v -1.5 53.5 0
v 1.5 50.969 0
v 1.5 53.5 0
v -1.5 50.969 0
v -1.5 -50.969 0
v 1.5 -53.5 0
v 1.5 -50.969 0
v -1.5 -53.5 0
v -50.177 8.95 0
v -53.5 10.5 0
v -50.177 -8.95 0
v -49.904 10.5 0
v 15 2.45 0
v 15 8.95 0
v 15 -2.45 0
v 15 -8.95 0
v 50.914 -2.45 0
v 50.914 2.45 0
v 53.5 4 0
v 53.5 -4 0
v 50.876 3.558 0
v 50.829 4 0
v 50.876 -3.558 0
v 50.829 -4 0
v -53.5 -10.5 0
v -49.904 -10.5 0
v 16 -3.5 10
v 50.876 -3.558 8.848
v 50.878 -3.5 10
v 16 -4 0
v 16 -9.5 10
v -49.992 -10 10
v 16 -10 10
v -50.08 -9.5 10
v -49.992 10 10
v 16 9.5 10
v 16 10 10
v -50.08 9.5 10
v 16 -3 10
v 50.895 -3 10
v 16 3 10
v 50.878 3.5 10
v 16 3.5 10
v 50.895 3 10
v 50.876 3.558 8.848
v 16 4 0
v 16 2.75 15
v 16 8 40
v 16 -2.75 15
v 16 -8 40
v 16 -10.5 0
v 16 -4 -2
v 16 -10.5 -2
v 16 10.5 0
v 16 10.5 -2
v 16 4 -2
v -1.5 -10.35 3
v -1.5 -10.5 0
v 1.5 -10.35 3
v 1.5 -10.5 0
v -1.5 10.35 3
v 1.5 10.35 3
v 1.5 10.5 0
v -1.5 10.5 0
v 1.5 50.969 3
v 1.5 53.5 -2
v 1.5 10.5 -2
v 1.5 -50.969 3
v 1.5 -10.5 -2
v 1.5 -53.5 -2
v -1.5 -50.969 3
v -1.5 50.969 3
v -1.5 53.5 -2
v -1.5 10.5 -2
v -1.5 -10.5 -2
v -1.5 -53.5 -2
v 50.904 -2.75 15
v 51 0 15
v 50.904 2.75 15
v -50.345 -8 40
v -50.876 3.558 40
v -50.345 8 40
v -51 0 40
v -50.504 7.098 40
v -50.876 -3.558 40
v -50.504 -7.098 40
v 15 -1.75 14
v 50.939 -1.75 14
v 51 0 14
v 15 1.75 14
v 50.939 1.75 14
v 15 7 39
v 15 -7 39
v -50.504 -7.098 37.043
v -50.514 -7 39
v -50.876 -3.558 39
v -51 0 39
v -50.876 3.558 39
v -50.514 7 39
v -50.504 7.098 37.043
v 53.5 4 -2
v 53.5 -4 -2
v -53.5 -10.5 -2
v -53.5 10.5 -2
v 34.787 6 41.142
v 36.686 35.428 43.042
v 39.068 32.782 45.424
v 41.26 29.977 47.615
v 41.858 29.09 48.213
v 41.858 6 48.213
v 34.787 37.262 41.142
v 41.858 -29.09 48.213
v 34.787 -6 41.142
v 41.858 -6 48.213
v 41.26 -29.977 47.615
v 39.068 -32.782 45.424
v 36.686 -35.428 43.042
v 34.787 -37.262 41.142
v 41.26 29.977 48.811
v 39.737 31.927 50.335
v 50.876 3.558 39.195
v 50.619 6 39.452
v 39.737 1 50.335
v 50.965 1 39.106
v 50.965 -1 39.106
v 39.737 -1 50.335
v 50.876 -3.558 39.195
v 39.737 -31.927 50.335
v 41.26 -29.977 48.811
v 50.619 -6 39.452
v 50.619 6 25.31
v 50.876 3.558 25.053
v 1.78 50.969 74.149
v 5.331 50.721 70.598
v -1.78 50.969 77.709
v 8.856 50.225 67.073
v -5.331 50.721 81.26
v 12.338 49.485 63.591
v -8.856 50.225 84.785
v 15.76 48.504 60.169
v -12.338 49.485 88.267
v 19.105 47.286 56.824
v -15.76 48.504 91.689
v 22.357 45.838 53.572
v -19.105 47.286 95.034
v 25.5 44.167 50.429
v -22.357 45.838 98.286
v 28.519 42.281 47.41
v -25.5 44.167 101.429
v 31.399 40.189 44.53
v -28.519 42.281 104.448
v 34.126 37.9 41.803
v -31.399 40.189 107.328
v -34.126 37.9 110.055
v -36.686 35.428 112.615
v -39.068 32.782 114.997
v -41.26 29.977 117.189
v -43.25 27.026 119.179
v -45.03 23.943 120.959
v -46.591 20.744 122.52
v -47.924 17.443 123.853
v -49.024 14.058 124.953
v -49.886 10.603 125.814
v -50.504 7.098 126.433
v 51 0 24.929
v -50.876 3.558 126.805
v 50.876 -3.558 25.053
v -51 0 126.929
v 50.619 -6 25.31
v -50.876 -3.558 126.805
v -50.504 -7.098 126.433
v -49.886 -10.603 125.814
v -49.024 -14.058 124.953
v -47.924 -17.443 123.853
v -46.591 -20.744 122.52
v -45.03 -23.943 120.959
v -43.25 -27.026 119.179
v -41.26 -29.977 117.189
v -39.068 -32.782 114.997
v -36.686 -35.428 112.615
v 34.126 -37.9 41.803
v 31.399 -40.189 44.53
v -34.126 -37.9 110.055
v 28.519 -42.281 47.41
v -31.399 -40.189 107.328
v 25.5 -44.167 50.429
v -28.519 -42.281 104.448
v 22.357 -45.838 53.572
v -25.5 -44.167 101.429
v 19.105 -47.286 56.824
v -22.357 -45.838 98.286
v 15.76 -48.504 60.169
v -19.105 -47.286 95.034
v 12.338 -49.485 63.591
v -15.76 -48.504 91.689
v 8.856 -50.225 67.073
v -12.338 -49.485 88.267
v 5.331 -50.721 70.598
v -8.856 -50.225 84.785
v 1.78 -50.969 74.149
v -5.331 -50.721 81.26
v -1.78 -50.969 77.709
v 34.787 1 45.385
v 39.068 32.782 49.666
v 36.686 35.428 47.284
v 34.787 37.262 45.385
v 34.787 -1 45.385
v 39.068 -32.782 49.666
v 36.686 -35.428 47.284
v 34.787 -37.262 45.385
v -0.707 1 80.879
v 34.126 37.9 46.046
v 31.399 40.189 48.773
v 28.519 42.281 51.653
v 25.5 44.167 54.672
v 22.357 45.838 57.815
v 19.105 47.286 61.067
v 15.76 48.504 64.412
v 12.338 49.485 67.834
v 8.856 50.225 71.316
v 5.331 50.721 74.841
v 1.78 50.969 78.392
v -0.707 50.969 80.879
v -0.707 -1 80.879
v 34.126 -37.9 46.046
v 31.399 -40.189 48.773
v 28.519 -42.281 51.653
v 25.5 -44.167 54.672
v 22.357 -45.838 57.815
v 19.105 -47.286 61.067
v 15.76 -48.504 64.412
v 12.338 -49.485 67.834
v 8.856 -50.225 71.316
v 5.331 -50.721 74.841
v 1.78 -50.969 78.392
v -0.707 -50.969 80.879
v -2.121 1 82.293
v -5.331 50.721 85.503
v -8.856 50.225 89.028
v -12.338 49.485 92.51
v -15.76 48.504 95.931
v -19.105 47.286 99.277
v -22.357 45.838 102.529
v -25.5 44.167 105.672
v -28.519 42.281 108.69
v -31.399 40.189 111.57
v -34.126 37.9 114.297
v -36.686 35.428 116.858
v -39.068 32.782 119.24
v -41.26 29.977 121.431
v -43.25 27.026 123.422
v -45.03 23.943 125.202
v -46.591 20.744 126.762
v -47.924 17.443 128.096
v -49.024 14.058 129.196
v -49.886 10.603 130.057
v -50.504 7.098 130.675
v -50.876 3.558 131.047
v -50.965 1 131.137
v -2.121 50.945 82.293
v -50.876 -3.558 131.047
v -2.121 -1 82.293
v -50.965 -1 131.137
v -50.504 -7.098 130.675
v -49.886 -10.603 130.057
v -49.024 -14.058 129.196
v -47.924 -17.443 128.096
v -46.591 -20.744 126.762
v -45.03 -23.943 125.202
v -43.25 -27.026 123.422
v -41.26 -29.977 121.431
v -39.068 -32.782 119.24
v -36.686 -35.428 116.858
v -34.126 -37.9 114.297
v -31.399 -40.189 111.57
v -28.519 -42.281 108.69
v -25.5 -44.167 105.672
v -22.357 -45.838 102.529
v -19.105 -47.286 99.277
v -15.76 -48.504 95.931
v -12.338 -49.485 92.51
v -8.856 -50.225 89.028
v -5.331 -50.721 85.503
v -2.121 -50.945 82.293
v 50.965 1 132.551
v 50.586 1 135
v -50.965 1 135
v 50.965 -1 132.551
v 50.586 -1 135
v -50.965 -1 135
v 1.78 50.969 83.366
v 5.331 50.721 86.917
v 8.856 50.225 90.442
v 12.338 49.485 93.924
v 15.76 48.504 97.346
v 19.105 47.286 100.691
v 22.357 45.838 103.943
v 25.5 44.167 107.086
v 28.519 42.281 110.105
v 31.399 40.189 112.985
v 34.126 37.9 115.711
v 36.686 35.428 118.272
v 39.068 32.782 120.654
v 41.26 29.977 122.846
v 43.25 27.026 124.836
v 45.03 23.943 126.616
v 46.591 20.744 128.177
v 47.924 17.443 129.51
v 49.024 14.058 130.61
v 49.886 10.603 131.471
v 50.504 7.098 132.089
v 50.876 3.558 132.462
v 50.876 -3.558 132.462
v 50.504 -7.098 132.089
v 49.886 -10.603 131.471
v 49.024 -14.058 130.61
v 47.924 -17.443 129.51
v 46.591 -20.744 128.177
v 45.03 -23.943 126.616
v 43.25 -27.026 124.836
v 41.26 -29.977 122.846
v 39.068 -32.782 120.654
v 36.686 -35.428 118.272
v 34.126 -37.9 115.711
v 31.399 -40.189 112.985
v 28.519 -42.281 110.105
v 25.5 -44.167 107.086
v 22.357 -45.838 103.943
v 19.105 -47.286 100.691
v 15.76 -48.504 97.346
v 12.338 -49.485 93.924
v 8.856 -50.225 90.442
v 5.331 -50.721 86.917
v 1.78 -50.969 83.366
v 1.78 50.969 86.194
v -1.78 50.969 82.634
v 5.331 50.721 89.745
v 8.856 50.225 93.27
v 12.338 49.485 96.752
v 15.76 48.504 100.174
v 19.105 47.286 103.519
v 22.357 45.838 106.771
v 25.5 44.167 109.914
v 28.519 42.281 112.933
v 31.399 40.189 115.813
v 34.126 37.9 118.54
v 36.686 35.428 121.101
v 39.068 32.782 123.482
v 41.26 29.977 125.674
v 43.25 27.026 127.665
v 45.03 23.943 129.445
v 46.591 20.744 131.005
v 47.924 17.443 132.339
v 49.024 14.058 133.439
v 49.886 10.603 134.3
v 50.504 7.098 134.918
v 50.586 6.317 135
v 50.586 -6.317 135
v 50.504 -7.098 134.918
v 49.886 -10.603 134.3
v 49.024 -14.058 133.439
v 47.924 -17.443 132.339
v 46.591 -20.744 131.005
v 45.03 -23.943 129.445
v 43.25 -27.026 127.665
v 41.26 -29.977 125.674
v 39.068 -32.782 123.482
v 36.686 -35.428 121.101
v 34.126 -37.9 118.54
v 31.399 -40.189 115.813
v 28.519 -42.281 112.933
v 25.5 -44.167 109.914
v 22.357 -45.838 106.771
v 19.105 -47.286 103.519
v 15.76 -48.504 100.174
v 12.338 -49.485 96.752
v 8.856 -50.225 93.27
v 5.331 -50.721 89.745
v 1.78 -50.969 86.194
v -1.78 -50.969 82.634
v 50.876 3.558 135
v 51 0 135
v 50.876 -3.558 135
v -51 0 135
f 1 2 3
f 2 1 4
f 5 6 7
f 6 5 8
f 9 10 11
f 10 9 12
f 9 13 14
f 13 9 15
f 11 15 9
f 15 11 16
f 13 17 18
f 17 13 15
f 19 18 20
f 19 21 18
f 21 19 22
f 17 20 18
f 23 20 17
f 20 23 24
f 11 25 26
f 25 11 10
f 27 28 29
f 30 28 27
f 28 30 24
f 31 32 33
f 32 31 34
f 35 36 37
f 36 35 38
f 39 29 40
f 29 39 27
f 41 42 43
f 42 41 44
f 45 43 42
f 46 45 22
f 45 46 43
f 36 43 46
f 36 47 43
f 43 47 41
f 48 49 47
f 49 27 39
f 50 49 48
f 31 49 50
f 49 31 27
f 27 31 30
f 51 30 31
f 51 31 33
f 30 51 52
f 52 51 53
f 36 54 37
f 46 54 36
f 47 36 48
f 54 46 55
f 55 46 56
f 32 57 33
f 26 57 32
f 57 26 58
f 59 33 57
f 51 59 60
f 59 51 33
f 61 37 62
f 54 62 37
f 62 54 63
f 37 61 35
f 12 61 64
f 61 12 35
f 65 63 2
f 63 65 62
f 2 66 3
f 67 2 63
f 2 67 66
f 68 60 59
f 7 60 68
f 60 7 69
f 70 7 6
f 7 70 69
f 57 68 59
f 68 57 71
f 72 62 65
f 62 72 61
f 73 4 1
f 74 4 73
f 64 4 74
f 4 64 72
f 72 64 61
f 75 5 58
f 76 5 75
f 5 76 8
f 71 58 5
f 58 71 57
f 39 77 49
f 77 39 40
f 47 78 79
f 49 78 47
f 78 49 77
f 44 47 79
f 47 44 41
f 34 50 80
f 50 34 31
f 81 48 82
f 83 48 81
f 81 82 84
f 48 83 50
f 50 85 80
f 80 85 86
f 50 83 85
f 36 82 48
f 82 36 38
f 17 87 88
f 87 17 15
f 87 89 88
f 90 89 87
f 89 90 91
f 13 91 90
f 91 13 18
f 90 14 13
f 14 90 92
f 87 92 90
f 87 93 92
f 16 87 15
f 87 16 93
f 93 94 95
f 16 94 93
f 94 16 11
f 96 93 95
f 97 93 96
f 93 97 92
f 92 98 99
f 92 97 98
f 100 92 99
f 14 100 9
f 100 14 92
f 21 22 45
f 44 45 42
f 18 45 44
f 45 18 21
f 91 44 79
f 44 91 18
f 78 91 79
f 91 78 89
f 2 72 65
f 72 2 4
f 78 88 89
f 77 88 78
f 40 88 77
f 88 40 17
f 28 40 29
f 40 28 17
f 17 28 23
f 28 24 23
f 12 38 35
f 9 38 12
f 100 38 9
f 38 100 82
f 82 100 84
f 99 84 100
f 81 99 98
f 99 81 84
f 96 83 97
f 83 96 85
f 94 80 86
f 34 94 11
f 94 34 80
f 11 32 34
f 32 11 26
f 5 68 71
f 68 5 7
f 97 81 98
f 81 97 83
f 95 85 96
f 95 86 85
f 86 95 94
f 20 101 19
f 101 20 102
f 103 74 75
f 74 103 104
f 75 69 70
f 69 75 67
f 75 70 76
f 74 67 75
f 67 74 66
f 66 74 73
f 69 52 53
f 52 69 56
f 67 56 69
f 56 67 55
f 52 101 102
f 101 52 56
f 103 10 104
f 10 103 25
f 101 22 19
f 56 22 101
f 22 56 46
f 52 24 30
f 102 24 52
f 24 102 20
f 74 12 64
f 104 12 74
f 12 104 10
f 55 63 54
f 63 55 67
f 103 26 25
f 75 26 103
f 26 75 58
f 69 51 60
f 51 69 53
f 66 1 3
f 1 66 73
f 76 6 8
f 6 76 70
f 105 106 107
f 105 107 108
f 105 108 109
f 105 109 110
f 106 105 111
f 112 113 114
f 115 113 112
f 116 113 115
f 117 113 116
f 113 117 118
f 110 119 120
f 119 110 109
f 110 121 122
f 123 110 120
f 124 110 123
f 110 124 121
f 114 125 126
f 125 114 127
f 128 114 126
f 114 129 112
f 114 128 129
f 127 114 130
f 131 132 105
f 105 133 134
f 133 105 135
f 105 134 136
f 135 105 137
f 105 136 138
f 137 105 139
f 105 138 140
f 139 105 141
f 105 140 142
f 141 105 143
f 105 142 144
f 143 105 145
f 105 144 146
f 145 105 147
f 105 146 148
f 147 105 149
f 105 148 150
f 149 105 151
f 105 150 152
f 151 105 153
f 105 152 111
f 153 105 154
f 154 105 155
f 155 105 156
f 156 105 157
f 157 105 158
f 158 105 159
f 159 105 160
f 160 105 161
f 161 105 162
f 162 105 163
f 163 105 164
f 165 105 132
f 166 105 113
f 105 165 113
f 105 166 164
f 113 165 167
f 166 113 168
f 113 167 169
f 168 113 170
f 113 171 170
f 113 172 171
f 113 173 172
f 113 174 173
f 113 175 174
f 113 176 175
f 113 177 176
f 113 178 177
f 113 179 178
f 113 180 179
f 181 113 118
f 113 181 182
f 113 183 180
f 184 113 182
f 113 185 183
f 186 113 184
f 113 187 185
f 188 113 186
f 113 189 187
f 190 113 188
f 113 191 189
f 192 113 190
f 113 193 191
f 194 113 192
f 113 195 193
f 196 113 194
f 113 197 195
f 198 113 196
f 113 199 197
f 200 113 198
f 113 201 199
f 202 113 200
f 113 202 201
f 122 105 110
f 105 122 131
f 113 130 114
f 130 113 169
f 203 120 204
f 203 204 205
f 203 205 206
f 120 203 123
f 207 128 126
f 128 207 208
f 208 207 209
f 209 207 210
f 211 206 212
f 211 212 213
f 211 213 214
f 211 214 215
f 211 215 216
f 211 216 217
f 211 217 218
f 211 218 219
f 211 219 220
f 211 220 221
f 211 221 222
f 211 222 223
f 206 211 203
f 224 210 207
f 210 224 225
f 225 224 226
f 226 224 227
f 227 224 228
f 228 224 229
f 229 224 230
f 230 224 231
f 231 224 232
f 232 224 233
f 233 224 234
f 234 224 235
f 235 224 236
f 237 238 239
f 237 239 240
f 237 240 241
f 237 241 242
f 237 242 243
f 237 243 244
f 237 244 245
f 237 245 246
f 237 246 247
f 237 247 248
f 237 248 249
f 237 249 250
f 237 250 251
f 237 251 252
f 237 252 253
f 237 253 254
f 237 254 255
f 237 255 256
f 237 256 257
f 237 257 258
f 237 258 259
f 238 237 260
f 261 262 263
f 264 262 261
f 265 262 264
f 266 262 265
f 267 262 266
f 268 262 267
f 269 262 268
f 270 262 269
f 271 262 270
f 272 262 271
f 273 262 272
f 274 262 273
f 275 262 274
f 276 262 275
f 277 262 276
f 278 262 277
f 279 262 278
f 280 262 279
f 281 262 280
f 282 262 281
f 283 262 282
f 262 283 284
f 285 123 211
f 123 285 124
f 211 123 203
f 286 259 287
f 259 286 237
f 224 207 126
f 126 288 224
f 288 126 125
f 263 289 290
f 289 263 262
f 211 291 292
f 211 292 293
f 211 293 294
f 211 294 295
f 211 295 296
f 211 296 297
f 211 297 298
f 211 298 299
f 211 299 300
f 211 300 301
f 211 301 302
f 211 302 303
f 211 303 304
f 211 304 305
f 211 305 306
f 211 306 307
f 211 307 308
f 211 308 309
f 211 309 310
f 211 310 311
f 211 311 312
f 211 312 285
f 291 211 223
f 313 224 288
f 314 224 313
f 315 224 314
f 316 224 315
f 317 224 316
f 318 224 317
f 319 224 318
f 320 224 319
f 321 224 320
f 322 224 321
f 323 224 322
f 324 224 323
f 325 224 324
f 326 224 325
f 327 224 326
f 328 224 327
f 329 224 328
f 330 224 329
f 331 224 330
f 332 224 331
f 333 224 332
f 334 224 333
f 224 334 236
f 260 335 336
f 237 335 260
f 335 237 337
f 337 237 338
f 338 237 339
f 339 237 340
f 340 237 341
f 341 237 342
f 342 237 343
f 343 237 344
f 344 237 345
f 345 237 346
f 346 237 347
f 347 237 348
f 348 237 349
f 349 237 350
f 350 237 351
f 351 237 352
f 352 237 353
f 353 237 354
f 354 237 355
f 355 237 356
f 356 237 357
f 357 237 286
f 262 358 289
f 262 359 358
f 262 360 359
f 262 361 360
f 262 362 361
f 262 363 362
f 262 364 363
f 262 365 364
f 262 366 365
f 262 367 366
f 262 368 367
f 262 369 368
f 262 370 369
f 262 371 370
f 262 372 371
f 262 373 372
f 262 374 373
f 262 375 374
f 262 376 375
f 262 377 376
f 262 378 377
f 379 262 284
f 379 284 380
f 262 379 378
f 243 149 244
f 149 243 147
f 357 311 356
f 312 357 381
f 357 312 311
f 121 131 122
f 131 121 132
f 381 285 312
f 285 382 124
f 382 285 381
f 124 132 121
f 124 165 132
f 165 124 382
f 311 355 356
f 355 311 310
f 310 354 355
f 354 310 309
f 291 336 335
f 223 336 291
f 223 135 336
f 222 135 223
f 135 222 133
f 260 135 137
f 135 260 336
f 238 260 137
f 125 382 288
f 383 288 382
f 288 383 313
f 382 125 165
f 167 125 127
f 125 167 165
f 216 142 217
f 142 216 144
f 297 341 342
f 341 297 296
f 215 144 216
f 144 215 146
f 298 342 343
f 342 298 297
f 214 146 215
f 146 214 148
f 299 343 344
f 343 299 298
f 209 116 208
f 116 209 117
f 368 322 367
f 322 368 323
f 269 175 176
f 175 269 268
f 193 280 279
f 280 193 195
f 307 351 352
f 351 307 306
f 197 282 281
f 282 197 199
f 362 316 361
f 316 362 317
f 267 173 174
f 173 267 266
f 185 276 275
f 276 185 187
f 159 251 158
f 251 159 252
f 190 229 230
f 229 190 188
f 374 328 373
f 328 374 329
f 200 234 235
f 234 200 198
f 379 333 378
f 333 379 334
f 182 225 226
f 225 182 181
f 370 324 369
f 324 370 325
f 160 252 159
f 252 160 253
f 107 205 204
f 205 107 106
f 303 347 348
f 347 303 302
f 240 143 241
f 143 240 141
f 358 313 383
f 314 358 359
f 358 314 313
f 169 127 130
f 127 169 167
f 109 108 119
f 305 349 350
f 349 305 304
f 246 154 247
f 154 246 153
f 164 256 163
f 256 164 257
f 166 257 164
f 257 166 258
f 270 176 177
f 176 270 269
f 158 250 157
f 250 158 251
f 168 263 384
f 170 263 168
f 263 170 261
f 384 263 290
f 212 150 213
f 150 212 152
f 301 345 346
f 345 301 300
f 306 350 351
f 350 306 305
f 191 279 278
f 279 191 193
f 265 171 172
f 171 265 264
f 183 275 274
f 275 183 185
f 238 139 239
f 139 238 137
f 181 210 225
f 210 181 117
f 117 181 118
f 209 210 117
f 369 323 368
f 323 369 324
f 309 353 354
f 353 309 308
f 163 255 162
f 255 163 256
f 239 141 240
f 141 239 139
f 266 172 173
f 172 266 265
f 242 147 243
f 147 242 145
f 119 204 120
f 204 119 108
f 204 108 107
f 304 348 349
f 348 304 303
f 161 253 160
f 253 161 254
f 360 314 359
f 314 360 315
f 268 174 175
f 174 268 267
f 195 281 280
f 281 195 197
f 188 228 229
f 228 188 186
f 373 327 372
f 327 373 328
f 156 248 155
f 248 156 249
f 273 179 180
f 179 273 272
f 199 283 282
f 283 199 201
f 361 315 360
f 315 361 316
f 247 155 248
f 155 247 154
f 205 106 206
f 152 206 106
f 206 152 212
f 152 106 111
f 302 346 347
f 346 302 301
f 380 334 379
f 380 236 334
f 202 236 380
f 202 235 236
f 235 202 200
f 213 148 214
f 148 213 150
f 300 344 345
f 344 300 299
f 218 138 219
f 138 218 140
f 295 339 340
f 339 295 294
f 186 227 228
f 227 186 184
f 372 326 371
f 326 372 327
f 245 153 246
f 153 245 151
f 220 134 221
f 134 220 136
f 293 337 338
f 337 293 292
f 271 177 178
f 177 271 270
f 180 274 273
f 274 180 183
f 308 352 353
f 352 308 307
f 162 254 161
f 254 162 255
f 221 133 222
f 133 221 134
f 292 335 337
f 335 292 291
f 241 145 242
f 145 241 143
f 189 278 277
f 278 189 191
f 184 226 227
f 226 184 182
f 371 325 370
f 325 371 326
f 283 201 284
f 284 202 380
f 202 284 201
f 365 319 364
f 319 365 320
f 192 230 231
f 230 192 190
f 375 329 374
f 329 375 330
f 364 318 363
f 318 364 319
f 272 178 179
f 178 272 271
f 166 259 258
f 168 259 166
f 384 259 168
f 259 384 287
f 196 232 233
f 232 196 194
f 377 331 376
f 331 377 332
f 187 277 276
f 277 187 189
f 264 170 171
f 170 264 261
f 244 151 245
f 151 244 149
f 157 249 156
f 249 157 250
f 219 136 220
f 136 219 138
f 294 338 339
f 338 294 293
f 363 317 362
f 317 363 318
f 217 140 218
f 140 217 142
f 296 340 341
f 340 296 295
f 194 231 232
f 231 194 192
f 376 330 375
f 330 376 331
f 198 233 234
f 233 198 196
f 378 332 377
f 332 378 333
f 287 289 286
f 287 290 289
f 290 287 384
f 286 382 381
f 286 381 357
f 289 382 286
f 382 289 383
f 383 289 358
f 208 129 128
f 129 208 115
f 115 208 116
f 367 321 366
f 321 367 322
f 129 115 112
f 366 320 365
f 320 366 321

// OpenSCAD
// file: definitions.scad
S2 = sqrt(2);
ATOM = 0.001;

PIPE_THICKNESS = 2.5;
PIPE_DIAMETER_INNER = 102;
PIPE_DIAMETER_OUTER = PIPE_DIAMETER_INNER + 2 * PIPE_THICKNESS;
PIPE_MARGIN = 10;
PIPE_HEIGHT = 135; // please manually adjust

WALL_THICKNESS = 3;
WALL_THIN_THICKNESS = 2;
WALL_THINNER_THICKNESS = 1;
REST_HEIGHT = 10;
REST_LENGTH = 25;
BASE_MIN_THICKNESS = 25;
PLUG_GROVE_WIDTH = 12;
CABLE_GROVE_WIDTH = 7;
CABLE_GROVE_HEIGHT = 5;

CAVITY_WIDTH = 20;
CAVITY_SHORTAGE = 35;
CAVITY_HEIGHT = 30;
MARK_THICKNESS = 0.5;
STOP_THICKNESS = 2;

SUPPORT_THICKNESS = 0.5;

$fn = 90;

module barrel(outer_radius, inner_radius, height) {
    scale([1, 1, height])
    difference() {
        cylinder(r=outer_radius);
        if (inner_radius)
            translate([0, 0, -0.5]) scale([1, 1, 2])
            cylinder(r=inner_radius);
    }
}

module trapezoid(size, center) {
//    cube(size, center);
    x = size[0];
    y = size[1];
    z = size[2];
    d = z / 20; // conicity
    
    points = [
    [ 0,  0,  0 ],  //0
    [ x,  0,  0 ],  //1
    [ x,  y,  0 ],  //2
    [ 0,  y,  0 ],  //3
    [ 0,  d,  z ],  //4
    [ x,  d,  z ],  //5
    [ x,  y-d,  z ],  //6
    [ 0,  y-d,  z ]]; //7

    faces = [
    [0,1,2,3],  // bottom
    [4,5,1,0],  // front
    [7,6,5,4],  // top
    [5,6,2,1],  // right
    [6,7,3,2],  // back
    [7,4,0,3]]; // left

    if(center)
        translate([-x/2, -y/2, -z/2])
        polyhedron(points, faces);
    else
        polyhedron(points, faces);
}
// main file
include <definitions.scad>
elevation =  BASE_MIN_THICKNESS + PIPE_DIAMETER_INNER/2 + PIPE_MARGIN - WALL_THICKNESS;

module diagonal_end_rest_raw(thin=false) {
    translate([0, 0, elevation])
    rotate([0, 45, 0]) {
        // bottom-most wall, shorter to create rest
        translate([0, 0, -REST_HEIGHT/2])
        difference() {
            // wall, full surface, creating rest top
            thickness = thin ? SUPPORT_THICKNESS : WALL_THICKNESS;
            dz = REST_HEIGHT + thickness/2;
            translate([-dz, 0, dz])
            cube([PIPE_DIAMETER_INNER* S2 *2, PIPE_DIAMETER_INNER, thickness], true);

            // remove extraneous rest top
            translate([-REST_LENGTH-WALL_THICKNESS, 0, REST_HEIGHT])
            cube([PIPE_DIAMETER_INNER* S2 + REST_HEIGHT*S2, PIPE_DIAMETER_INNER+ATOM*2, REST_HEIGHT+WALL_THICKNESS], true);
        }
    }
}

module diagonal_end_rest(thin=false, recessed=false) {
    intersection() {
        radius = PIPE_DIAMETER_INNER/2 - (recessed ? SUPPORT_THICKNESS : 0);
        diagonal_end_rest_raw(thin);
        barrel(radius, 0, PIPE_HEIGHT);
    }
}

module diagonal_end_raw() {
    translate([0, 0, elevation])
    rotate([0, 45, 0]) {
        //
        // bottom-most wall, shorter to create rest
        //
        difference() {
            union() {
                translate([-REST_LENGTH, 0, 0])
                cube([PIPE_DIAMETER_INNER* S2 + REST_HEIGHT*S2, PIPE_DIAMETER_INNER, REST_HEIGHT], true);
                // cable grove
                cube([PIPE_DIAMETER_INNER* S2 + REST_HEIGHT*S2, PLUG_GROVE_WIDTH, REST_HEIGHT], true);   
            }
            translate([-REST_LENGTH-WALL_THICKNESS, 0, WALL_THICKNESS*1.5])
            cube([PIPE_DIAMETER_INNER* S2 + REST_HEIGHT*S2, PIPE_DIAMETER_INNER, REST_HEIGHT+WALL_THICKNESS], true);
        }

        // long foot
        h = PIPE_DIAMETER_INNER * 2;
        translate([0, 0, h/2 - REST_HEIGHT/2])
        cube ([PIPE_DIAMETER_INNER* S2*S2, WALL_THIN_THICKNESS, h], true);

        // short foot
        translate([0, 0, PIPE_DIAMETER_INNER/2 - REST_HEIGHT/2])
        cube ([WALL_THIN_THICKNESS, PIPE_DIAMETER_INNER, PIPE_DIAMETER_INNER], true);
    }
}

module diagonal_end(flat=false) {
    sink = flat ? -elevation + REST_HEIGHT / S2 : 0;
    rot = flat ? -45 : 0;
    
    rotate([0, rot, 0])
    translate([0, 0, sink])
    {
if($t>0.5)
    diagonal_end_rest();
        intersection() {
            diagonal_end_raw();
            barrel(PIPE_DIAMETER_INNER/2, 0, PIPE_HEIGHT);
        }
    }
}

module diagonal_end_rest_border() {
    sink = -elevation + REST_HEIGHT / S2;
    rot = -45;
    
    rotate([0, rot, 0])
    translate([0, 0, sink]) {
        difference() {
            diagonal_end_rest(thin=true);
            diagonal_end_rest(thin=true, recessed=true);
        }
    }
}


module perpendicular_end_raw(recess) {
    translate([0, 0, CABLE_GROVE_HEIGHT/2 + PIPE_MARGIN/2])
    trapezoid ([PIPE_DIAMETER_OUTER, CABLE_GROVE_WIDTH-recess*2, CABLE_GROVE_HEIGHT + PIPE_MARGIN], true);

    translate([-CAVITY_SHORTAGE/2, 0, CAVITY_HEIGHT/2 + PIPE_MARGIN/2])
    trapezoid ([PIPE_DIAMETER_INNER-CAVITY_SHORTAGE, CAVITY_WIDTH-recess*2, CAVITY_HEIGHT + PIPE_MARGIN], true);

    if (!recess) {
        // marks
        translate([0, 0, PIPE_MARGIN/2])
        trapezoid ([PIPE_DIAMETER_OUTER, CABLE_GROVE_WIDTH+MARK_THICKNESS*2-recess*2, PIPE_MARGIN], true);

        translate([-CAVITY_SHORTAGE/2, 0, PIPE_MARGIN/2])
        trapezoid ([PIPE_DIAMETER_INNER-CAVITY_SHORTAGE, CAVITY_WIDTH+MARK_THICKNESS*2-recess*2, PIPE_MARGIN], true);
        
        // strut
        strut_height = WALL_THICKNESS;
        translate([0, 0, strut_height/2])
        cube ([WALL_THICKNESS, PIPE_DIAMETER_INNER, strut_height], true); 
    }
}

module perpendicular_end_stop() {
    translate([0, 0, -STOP_THICKNESS/2])
    cube ([PIPE_DIAMETER_OUTER, CABLE_GROVE_WIDTH+MARK_THICKNESS*2, STOP_THICKNESS], true);

    translate([-CAVITY_SHORTAGE/2 -PIPE_THICKNESS/2, 0, -STOP_THICKNESS/2])
    cube ([PIPE_DIAMETER_OUTER-PIPE_THICKNESS-CAVITY_SHORTAGE, CAVITY_WIDTH+MARK_THICKNESS*2, STOP_THICKNESS], true);
    
    translate([0, 0, -STOP_THICKNESS/2])
    cube ([WALL_THICKNESS, PIPE_DIAMETER_OUTER, STOP_THICKNESS], true); 
}

module perpendicular_end(flat=false) {
    translate([0, 0, flat ? STOP_THICKNESS : 0])
    {
        intersection() {
             difference(){
                perpendicular_end_raw(0);
                 translate([-WALL_THINNER_THICKNESS, 0, -WALL_THINNER_THICKNESS])
                perpendicular_end_raw(WALL_THINNER_THICKNESS);
            }
            barrel(PIPE_DIAMETER_INNER/2, 0, PIPE_HEIGHT);
        }
        perpendicular_end_stop();
    }
}

perpendicular_end();
diagonal_end();
%barrel(PIPE_DIAMETER_OUTER/2, PIPE_DIAMETER_INNER/2, PIPE_HEIGHT);
